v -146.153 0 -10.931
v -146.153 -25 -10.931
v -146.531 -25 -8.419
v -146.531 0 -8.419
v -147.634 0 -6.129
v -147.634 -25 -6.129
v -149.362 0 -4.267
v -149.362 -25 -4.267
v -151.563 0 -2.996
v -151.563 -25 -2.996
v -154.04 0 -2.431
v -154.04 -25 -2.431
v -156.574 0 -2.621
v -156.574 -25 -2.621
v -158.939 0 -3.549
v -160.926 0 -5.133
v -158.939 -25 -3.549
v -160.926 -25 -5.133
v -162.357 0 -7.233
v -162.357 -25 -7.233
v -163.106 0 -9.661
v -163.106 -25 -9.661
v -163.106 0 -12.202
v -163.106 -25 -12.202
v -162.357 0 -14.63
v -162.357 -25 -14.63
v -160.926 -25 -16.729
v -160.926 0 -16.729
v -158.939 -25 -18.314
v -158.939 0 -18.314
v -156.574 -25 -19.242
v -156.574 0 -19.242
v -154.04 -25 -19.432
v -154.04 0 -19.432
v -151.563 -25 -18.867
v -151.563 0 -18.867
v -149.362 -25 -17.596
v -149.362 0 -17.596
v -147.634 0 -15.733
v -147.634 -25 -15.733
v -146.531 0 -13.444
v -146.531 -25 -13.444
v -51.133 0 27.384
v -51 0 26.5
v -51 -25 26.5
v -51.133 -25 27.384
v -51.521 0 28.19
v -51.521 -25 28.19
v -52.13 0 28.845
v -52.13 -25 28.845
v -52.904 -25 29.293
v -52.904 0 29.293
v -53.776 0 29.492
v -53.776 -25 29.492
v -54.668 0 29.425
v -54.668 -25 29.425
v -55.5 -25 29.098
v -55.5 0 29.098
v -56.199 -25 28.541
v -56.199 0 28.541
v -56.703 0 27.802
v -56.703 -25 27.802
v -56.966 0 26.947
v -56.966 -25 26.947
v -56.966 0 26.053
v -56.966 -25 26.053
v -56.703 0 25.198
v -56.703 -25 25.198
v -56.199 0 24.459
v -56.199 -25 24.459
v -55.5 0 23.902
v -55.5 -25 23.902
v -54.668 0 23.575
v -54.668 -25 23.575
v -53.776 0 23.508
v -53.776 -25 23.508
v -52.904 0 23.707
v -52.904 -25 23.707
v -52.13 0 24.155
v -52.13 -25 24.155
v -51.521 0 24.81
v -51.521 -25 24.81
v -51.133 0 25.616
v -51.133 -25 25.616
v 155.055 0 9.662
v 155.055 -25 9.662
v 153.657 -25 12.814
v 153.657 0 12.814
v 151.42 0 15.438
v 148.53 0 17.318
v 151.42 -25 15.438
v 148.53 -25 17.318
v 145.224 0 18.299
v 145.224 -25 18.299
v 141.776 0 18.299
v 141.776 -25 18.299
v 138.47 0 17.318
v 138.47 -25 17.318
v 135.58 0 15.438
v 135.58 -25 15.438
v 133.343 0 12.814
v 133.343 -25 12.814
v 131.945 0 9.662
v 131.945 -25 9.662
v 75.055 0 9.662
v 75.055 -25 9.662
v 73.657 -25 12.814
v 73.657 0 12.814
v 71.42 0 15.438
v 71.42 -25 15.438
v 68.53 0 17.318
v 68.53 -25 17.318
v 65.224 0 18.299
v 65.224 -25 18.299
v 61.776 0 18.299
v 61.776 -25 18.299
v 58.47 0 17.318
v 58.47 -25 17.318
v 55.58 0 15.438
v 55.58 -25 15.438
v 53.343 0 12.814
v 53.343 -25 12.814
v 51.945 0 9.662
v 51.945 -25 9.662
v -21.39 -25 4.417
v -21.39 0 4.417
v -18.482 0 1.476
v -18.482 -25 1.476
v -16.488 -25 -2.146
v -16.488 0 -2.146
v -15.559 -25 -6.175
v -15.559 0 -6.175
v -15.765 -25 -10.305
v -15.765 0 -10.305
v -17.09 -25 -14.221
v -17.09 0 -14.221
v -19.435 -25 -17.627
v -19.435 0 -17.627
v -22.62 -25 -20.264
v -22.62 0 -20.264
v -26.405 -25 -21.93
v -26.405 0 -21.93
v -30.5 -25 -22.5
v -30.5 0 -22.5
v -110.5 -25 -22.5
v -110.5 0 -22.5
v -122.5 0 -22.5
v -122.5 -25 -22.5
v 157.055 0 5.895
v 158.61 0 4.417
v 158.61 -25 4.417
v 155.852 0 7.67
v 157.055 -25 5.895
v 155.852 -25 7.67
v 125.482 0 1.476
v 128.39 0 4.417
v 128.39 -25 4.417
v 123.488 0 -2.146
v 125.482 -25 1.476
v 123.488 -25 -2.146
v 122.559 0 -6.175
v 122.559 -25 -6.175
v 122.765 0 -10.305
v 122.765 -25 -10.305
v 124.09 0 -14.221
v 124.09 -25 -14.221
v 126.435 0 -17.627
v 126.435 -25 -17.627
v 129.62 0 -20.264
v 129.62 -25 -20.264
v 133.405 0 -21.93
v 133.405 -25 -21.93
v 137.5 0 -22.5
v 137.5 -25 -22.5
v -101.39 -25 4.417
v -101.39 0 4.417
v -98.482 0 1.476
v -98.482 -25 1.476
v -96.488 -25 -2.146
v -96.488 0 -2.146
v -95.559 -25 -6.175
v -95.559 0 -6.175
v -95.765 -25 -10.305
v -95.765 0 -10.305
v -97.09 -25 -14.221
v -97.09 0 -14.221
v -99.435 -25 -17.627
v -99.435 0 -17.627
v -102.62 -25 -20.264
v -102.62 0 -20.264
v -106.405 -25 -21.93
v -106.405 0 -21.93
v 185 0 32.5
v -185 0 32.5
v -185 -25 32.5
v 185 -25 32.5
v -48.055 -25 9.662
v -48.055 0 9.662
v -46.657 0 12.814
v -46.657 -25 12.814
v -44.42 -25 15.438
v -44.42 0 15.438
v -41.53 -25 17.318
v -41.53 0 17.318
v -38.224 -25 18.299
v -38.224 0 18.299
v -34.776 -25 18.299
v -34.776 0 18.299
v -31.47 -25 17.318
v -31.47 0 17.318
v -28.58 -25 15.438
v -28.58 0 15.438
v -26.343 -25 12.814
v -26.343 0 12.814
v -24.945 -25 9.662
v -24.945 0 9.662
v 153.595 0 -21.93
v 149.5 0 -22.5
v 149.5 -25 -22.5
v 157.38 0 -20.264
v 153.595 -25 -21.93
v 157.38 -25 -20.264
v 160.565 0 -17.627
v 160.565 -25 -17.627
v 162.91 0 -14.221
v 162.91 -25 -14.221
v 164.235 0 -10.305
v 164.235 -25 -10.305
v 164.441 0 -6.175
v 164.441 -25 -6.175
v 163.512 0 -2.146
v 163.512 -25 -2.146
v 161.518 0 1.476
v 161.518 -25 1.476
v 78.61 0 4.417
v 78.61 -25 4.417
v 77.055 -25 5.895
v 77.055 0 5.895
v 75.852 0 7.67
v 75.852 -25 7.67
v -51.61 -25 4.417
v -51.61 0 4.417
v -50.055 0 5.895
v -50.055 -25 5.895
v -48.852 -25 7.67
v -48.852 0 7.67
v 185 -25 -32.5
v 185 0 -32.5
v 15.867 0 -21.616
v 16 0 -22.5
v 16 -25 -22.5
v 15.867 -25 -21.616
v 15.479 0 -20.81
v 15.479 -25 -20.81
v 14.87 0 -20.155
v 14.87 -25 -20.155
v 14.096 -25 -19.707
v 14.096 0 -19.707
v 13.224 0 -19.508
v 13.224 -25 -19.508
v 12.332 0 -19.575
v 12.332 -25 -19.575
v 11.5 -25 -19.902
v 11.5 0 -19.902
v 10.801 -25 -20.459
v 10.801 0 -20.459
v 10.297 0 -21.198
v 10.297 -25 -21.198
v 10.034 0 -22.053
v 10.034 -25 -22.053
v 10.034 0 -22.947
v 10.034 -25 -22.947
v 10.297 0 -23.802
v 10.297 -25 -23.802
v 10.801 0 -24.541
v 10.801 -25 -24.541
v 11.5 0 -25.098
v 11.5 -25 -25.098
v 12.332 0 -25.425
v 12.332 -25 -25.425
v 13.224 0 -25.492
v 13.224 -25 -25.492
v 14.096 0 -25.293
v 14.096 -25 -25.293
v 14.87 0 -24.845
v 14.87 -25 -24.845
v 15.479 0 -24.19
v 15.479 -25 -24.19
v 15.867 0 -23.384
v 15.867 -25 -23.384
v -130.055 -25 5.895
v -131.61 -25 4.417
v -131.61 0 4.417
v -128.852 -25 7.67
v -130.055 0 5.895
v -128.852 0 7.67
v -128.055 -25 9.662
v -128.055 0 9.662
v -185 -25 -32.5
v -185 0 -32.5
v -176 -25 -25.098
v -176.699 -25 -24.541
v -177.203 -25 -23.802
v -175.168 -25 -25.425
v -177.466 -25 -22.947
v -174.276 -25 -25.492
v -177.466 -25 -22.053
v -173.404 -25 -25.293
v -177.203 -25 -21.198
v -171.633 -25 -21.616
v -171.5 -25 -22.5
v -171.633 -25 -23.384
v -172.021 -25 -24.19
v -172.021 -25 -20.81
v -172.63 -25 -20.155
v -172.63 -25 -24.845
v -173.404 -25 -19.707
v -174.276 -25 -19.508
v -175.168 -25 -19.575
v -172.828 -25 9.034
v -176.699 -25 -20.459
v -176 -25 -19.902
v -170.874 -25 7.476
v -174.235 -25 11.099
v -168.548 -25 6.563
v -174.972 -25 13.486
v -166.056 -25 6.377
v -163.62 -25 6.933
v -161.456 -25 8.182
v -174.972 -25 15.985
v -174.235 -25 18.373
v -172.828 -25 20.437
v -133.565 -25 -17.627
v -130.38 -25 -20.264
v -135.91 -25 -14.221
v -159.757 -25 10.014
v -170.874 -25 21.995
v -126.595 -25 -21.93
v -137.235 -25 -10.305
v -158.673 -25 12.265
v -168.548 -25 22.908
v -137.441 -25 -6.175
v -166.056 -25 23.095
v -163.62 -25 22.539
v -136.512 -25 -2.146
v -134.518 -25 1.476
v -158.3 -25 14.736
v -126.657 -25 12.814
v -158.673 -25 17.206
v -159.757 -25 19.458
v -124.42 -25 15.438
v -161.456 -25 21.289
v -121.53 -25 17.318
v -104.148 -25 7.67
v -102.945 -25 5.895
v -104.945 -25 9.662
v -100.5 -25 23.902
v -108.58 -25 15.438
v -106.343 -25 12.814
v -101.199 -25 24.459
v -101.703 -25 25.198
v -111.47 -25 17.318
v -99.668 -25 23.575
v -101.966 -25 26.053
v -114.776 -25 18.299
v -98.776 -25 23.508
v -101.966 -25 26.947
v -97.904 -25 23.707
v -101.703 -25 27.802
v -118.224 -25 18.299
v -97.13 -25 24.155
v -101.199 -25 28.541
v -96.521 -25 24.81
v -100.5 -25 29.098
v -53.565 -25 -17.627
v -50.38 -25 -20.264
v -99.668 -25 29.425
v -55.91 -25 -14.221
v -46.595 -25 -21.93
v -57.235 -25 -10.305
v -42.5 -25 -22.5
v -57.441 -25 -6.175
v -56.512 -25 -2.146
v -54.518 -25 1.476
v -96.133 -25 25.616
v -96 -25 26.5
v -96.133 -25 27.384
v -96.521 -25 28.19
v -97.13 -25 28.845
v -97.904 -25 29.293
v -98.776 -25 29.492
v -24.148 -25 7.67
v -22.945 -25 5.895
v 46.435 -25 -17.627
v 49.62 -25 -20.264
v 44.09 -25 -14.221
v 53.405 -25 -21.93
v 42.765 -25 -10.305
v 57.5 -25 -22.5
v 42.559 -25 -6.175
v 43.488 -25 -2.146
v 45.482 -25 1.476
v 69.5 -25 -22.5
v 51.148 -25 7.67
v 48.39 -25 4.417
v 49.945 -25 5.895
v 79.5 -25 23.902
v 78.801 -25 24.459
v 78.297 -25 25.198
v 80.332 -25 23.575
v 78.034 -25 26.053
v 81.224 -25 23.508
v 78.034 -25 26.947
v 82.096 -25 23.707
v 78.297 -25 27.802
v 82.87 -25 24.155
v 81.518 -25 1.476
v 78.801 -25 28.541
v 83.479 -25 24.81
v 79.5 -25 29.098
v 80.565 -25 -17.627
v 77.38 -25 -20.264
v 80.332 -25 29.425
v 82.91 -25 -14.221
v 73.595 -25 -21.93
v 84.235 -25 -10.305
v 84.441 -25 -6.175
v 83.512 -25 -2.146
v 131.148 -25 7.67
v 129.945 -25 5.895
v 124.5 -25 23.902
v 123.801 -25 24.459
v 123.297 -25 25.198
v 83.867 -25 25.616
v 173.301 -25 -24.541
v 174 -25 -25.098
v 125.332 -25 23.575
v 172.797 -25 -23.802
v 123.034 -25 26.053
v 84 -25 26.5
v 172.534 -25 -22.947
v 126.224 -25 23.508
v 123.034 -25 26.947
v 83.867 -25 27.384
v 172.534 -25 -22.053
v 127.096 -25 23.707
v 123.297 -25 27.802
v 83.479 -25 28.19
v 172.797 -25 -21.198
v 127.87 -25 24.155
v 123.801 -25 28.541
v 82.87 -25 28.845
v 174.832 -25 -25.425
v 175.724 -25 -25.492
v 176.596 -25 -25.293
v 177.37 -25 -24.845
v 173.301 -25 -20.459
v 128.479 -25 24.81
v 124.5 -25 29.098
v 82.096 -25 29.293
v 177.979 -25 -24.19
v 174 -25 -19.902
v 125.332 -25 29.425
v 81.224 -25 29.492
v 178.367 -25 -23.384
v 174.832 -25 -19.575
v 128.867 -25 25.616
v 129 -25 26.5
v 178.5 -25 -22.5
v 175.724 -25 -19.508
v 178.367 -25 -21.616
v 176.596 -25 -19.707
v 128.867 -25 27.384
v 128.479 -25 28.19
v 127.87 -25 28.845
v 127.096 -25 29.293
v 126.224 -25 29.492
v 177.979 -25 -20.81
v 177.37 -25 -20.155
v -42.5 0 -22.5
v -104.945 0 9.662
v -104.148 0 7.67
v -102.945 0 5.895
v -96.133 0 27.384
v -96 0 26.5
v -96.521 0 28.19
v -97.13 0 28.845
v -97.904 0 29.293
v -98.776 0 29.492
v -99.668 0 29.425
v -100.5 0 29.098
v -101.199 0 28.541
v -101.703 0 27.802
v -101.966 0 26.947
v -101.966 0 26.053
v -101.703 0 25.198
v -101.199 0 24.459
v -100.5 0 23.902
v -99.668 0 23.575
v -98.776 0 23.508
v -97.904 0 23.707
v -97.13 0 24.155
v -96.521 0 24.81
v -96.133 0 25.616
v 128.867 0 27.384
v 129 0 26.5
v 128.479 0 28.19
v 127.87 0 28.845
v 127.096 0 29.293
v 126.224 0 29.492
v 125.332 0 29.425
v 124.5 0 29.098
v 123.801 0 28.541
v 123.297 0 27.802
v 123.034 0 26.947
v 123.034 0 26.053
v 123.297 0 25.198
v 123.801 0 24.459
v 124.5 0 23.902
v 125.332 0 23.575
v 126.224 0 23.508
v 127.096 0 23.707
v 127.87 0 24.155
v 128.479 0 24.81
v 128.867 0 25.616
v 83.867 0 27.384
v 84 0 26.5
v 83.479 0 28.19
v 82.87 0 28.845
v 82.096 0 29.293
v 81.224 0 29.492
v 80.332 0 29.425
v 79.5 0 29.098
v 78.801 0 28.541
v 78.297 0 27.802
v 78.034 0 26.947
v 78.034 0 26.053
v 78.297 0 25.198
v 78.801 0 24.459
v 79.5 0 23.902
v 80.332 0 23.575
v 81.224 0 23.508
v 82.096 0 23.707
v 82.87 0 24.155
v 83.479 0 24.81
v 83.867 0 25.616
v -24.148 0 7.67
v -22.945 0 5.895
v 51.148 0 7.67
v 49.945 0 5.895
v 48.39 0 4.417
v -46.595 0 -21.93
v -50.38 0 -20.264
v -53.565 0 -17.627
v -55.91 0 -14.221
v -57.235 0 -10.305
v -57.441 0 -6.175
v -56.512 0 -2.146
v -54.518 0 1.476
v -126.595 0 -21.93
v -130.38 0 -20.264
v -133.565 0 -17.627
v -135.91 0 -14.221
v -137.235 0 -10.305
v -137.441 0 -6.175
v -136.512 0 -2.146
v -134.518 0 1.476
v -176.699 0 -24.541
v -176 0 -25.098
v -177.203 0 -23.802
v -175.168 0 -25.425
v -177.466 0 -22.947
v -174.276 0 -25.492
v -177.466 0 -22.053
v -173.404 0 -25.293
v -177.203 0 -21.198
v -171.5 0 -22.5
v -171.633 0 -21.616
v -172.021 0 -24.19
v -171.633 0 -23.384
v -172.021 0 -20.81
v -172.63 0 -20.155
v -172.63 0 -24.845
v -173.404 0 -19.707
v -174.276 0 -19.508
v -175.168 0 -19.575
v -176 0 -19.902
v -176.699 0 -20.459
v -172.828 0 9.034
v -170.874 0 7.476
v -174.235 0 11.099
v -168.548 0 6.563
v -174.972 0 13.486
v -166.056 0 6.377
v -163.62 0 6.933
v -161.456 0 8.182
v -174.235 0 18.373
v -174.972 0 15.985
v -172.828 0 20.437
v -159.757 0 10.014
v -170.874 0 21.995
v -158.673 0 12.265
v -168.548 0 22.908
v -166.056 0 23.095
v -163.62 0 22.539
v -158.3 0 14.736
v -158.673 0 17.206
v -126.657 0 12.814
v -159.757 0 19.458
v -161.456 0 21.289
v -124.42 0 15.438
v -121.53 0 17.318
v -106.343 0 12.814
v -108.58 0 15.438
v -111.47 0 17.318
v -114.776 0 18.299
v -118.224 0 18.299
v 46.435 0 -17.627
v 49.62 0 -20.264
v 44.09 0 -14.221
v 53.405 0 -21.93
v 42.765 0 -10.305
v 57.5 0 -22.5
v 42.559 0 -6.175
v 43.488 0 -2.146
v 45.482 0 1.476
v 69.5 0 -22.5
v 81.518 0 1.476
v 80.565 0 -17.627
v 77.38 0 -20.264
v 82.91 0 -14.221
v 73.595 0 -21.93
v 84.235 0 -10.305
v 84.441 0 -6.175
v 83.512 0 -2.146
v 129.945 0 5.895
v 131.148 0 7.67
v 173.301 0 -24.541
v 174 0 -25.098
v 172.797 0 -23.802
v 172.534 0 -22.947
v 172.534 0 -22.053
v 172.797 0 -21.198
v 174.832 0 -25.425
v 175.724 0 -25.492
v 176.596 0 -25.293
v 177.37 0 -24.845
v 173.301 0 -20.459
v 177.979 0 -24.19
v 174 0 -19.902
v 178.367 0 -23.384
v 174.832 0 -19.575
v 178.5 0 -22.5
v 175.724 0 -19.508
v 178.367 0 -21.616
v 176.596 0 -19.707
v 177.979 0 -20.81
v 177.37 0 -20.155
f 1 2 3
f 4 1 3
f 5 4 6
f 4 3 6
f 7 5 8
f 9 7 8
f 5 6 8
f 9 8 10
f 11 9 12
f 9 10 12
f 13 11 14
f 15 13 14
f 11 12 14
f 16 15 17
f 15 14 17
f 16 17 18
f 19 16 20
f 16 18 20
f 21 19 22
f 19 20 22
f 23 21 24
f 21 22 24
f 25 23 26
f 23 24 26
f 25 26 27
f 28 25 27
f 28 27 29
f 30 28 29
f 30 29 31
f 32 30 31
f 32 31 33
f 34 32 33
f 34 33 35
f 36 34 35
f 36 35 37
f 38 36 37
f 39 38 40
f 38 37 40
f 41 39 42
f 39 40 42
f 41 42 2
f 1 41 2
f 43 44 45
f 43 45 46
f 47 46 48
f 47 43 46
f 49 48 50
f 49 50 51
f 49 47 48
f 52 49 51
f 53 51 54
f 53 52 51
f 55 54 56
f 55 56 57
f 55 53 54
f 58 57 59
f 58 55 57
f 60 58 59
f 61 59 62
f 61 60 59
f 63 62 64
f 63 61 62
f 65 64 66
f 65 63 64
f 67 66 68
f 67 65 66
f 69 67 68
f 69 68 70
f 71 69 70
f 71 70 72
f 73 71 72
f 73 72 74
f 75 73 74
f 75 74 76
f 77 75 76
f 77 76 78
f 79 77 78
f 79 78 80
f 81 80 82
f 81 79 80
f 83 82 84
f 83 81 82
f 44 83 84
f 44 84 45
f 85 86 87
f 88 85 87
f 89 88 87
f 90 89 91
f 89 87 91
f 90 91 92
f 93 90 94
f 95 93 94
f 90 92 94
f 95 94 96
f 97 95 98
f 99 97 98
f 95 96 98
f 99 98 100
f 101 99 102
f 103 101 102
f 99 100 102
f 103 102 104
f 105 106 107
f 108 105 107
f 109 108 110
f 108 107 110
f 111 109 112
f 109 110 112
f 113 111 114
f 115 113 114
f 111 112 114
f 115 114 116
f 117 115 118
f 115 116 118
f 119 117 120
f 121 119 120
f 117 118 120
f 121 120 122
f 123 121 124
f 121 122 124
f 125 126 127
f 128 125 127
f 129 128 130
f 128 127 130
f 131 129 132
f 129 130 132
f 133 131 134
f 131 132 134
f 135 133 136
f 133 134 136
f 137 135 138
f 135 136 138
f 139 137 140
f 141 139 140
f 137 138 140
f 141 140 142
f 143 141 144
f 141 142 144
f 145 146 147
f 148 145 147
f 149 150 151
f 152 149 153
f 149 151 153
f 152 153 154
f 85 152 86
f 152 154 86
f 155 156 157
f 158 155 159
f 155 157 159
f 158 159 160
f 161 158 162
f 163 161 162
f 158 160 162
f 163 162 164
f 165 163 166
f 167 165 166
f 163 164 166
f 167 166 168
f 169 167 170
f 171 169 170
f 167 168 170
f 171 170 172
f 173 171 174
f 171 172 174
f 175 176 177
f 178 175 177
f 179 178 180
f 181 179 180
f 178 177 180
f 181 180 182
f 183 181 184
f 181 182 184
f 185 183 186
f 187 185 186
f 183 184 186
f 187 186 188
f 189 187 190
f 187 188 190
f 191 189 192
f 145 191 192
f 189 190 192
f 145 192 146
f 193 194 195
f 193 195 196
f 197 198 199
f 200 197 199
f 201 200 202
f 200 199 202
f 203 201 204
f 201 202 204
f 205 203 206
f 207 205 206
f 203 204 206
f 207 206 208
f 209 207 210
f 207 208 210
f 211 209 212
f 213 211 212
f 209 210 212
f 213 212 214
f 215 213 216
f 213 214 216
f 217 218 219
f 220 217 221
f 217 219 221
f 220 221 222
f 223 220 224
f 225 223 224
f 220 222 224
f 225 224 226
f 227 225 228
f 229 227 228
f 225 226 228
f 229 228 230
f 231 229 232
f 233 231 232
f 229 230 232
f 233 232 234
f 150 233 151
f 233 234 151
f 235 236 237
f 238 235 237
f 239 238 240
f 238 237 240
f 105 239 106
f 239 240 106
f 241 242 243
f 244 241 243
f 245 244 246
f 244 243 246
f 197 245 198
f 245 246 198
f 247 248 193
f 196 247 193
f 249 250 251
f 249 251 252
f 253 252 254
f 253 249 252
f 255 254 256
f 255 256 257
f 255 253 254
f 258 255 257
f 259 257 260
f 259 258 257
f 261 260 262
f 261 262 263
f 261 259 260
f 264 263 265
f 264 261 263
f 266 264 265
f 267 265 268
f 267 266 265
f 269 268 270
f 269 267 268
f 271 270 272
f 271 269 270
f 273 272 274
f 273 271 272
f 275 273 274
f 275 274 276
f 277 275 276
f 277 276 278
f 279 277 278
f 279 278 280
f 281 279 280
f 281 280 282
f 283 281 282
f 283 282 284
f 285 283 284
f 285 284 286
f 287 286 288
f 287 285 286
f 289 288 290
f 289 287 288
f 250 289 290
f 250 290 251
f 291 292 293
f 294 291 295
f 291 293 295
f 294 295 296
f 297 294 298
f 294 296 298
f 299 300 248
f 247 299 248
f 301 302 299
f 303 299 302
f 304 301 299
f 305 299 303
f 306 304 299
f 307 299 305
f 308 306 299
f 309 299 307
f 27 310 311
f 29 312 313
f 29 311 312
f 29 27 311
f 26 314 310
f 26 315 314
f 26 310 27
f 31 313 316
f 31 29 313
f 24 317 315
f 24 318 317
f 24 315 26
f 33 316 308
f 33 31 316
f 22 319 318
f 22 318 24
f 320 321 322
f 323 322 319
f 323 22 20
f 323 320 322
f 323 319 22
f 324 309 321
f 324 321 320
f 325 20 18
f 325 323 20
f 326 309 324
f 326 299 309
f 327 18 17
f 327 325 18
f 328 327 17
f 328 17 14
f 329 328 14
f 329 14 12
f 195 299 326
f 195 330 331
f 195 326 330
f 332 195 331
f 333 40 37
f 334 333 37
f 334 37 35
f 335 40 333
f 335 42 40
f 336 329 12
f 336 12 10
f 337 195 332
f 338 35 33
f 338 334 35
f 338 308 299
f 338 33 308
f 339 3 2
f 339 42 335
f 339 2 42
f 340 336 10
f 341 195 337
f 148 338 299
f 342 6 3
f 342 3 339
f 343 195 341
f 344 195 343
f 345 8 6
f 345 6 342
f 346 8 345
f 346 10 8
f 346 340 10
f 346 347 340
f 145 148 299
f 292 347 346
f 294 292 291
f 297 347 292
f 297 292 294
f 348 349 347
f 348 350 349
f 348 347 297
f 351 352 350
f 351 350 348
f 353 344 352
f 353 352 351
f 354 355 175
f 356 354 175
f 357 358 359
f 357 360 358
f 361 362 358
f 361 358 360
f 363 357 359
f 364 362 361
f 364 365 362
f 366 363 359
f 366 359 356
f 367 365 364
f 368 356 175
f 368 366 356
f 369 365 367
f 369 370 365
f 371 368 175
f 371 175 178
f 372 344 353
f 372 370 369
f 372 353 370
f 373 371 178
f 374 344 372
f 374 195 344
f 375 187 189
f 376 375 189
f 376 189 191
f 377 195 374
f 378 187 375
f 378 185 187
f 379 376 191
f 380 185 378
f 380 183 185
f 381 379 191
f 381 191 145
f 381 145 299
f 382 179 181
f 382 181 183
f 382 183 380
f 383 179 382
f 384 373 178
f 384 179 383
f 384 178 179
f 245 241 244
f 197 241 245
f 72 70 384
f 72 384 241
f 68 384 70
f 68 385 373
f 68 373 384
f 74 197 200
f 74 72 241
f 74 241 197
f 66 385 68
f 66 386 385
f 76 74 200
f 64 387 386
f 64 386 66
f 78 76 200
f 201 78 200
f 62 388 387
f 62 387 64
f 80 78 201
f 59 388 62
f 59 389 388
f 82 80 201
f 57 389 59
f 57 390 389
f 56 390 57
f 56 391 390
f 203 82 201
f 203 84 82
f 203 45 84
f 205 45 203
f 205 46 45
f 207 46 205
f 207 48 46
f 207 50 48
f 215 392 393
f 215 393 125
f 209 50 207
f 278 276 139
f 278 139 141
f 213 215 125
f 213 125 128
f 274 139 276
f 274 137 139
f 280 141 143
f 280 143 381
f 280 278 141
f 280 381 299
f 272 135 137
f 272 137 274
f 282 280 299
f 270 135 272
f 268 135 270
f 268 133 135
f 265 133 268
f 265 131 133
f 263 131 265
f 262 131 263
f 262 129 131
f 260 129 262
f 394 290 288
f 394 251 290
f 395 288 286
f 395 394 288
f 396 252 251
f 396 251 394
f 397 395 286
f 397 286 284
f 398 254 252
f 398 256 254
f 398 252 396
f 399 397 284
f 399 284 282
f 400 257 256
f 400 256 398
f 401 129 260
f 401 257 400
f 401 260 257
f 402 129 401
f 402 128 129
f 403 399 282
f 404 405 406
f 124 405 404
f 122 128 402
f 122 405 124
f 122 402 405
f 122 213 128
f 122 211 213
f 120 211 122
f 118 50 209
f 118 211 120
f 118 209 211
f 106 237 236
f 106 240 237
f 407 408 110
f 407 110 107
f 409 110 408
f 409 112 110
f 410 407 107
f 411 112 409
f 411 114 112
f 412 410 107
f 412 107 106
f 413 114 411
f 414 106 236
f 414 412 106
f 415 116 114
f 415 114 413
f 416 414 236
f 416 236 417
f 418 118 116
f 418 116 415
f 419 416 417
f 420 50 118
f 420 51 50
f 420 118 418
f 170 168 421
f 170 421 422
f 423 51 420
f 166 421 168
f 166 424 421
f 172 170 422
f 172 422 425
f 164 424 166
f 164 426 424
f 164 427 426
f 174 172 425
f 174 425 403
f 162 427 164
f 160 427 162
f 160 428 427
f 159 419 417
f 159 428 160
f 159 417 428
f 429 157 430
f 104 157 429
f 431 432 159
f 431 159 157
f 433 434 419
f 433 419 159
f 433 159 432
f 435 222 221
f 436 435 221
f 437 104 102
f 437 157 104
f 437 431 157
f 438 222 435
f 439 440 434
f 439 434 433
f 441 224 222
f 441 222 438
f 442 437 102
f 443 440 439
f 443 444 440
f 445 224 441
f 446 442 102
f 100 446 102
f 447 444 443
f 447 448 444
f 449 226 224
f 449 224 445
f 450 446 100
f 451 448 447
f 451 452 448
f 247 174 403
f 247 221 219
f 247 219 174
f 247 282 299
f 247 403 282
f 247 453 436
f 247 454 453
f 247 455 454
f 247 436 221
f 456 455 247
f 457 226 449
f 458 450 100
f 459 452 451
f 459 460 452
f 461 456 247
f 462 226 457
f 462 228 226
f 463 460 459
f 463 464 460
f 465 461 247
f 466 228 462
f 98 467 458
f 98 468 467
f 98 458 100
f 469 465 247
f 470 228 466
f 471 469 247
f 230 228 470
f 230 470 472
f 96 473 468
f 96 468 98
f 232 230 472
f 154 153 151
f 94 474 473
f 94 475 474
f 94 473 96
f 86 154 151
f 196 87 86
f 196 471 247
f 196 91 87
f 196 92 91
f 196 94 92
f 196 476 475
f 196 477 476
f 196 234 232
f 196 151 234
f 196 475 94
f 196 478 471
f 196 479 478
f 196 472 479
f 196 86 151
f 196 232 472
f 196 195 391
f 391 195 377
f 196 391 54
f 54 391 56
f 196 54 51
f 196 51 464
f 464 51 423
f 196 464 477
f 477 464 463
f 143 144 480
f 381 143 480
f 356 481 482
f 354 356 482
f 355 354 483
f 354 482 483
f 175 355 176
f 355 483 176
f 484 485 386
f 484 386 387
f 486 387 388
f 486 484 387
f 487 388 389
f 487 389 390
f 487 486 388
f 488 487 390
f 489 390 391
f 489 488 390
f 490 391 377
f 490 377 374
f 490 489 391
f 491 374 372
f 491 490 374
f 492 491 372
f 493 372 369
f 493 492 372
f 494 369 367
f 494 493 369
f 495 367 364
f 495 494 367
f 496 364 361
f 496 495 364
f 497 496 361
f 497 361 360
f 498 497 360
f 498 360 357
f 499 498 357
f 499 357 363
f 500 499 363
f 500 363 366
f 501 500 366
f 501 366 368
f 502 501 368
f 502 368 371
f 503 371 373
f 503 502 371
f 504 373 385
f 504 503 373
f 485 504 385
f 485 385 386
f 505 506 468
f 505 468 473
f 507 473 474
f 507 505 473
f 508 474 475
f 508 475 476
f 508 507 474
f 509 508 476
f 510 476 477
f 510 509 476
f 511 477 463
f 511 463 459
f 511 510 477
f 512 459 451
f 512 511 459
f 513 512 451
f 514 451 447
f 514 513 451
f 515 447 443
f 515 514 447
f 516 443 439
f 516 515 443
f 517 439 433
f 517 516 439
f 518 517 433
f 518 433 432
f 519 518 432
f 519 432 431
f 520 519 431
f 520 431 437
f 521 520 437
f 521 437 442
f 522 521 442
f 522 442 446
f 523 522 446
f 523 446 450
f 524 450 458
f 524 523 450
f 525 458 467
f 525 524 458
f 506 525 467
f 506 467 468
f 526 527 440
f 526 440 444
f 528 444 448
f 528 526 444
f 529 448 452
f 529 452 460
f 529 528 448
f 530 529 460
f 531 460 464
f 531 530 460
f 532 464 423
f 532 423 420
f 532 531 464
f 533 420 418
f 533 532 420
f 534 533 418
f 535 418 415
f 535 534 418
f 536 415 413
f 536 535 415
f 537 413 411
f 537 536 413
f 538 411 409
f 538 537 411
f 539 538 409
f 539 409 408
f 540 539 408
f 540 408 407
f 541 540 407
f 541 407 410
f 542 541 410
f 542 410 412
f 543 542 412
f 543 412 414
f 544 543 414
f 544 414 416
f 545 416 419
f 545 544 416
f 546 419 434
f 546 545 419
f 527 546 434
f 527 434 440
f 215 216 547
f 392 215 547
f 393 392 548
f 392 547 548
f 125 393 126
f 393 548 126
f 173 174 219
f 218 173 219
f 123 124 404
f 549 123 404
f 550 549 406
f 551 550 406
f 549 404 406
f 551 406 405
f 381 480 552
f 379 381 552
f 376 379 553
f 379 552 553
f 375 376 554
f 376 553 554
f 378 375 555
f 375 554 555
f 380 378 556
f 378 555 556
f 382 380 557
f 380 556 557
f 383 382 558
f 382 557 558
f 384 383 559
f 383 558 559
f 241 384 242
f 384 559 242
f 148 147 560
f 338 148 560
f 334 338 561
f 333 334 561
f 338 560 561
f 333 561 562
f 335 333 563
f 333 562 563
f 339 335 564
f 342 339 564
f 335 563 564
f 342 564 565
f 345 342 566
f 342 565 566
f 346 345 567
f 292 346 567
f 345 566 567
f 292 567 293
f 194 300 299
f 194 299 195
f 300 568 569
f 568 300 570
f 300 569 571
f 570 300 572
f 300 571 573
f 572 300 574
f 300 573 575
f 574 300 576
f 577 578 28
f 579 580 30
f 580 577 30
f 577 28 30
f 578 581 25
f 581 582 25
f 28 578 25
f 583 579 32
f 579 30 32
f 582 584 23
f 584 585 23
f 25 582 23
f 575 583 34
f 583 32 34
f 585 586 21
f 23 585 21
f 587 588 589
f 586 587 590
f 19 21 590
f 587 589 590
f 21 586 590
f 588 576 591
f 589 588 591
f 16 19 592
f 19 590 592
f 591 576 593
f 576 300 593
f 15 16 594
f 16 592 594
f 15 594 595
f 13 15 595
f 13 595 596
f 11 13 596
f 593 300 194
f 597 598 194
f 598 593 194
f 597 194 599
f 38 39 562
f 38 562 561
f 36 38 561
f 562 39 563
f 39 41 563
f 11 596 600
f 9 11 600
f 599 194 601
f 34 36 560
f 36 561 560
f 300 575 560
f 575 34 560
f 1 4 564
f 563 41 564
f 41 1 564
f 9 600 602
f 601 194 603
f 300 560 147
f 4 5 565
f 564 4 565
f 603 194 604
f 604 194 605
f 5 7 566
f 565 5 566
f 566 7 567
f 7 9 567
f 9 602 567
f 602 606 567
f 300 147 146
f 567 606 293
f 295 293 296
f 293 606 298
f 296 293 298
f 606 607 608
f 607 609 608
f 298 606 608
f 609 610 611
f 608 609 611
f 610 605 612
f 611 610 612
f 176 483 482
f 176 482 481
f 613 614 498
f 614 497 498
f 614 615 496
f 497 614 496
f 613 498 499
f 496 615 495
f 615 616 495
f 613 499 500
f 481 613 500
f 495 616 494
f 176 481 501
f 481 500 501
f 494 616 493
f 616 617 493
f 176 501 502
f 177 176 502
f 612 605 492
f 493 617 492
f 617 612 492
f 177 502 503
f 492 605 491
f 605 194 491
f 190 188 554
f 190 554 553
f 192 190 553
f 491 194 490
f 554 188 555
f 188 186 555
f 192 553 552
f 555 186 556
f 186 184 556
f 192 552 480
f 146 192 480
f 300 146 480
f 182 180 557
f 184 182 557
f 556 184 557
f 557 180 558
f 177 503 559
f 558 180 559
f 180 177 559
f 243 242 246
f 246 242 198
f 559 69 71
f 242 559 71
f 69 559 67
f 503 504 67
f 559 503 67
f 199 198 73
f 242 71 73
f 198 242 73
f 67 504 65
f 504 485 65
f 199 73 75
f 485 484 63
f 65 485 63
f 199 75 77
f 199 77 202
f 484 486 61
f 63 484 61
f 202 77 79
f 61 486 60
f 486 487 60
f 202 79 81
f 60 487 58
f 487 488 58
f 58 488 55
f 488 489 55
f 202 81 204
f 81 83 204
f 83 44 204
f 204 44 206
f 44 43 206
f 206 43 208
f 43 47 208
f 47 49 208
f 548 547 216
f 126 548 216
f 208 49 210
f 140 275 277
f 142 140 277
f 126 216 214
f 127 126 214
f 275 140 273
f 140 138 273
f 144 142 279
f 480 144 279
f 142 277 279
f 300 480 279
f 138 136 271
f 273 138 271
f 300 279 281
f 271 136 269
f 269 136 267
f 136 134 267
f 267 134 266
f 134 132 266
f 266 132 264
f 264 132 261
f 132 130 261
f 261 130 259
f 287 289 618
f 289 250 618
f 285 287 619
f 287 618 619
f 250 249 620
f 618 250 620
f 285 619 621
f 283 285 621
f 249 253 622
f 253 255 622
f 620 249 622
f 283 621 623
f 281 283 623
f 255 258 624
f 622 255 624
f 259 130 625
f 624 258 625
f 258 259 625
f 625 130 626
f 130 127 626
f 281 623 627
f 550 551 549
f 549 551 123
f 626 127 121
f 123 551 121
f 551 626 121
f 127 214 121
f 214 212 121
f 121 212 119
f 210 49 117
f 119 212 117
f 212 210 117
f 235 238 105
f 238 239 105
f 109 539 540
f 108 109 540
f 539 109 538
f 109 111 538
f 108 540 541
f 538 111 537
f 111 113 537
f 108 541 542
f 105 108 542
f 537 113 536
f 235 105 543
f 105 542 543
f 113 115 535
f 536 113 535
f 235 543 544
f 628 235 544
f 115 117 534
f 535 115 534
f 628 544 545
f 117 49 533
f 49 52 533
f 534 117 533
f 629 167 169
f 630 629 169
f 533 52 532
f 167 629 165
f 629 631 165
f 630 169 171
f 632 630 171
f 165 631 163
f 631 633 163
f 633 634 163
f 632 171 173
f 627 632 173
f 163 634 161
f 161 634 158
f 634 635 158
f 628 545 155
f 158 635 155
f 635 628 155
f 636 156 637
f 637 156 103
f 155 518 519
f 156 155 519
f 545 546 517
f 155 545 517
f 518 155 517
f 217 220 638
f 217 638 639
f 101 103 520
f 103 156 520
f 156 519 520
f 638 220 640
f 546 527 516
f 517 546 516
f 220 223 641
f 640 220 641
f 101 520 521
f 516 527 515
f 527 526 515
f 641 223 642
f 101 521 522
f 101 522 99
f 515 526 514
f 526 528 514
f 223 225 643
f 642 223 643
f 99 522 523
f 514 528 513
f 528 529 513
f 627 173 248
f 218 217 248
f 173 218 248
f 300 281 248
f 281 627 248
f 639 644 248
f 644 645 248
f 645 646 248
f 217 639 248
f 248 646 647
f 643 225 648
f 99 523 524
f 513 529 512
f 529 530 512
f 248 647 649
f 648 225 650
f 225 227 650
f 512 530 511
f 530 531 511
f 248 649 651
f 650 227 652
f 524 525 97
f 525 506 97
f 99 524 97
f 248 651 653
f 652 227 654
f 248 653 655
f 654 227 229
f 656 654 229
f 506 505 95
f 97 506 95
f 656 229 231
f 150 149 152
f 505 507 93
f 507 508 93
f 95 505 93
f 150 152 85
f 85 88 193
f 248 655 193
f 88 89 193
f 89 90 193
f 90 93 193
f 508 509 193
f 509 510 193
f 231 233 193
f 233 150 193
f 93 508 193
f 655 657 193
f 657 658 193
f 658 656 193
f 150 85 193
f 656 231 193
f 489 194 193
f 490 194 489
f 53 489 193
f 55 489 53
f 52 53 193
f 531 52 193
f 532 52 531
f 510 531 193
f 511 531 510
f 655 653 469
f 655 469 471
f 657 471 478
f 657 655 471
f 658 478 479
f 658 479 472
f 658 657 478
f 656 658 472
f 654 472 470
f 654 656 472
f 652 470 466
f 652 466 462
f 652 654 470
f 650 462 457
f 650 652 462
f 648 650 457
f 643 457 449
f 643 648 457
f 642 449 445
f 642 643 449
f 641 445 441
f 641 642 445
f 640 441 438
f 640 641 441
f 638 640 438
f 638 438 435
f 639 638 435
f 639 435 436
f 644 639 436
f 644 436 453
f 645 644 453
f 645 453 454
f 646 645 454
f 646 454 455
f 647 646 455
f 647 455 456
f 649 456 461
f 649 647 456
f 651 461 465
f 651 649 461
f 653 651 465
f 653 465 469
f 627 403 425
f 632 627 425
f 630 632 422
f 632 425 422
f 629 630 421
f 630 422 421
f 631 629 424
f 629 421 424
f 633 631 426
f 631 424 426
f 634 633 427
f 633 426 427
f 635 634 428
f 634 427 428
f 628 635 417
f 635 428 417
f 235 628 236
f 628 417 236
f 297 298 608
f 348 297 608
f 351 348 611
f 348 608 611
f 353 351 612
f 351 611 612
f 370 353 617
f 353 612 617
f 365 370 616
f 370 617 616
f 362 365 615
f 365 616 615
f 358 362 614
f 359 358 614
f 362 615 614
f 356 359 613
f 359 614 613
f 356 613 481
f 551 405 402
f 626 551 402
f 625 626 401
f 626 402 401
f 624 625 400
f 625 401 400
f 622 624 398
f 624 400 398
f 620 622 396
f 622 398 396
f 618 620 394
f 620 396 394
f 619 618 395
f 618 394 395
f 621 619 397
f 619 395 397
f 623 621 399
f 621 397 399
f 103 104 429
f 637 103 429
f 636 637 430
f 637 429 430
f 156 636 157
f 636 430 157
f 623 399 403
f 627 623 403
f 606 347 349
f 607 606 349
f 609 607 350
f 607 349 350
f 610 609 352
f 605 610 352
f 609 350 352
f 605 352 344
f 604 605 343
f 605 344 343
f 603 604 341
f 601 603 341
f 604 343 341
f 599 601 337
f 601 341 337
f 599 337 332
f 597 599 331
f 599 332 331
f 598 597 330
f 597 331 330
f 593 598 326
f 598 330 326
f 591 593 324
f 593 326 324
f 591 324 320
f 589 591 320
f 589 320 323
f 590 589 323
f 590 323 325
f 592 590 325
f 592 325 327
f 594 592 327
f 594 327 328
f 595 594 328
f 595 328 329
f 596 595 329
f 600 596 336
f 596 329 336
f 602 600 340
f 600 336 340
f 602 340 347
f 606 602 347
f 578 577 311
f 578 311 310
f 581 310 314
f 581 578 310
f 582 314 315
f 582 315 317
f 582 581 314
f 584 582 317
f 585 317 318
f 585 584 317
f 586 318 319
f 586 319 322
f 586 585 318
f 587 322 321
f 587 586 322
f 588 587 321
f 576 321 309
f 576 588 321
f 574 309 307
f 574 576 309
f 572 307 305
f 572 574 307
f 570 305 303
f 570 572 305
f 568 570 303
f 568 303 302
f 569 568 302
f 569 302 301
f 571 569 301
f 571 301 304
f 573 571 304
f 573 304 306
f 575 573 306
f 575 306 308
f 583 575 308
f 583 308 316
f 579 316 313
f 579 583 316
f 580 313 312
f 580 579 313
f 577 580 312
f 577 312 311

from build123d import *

# Parameters (mm, degrees)
F0_W     = 370
F0_H     = 65
F0_R     = 3
F1_DEPTH = 25
F3_DEPTH = 25
F4_R     = 8.382557
F4_R_2   = 8.524465
F5_DEPTH = 25


with BuildPart() as f1:
    # F0 (on Front) → F1 (new body)
    with BuildSketch(Plane.XZ):
        Rectangle(F0_W, F0_H)
        with Locations((-174.5, -22.5)):
            Circle(F0_R, mode=Mode.SUBTRACT)
        with BuildLine():
            ThreePointArc((-128.054669, 9.662031), (-116.5, 18.423264), (-104.945331, 9.662031))
            ThreePointArc((-104.945331, 9.662031), (-103.594078, 6.750238), (-101.389864, 4.416603))
            ThreePointArc((-101.389864, 4.416603), (-96.291745, -12.308896), (-110.5, -22.5))
            Line((-110.5, -22.5), (-122.5, -22.5))
            ThreePointArc((-122.5, -22.5), (-136.708255, -12.308896), (-131.610136, 4.416603))
            ThreePointArc((-131.610136, 4.416603), (-129.405922, 6.750238), (-128.054669, 9.662031))
        make_face(mode=Mode.SUBTRACT)
        with BuildLine():
            ThreePointArc((-48.054669, 9.662031), (-36.5, 18.423264), (-24.945331, 9.662031))
            ThreePointArc((-24.945331, 9.662031), (-23.594078, 6.750238), (-21.389864, 4.416603))
            ThreePointArc((-21.389864, 4.416603), (-16.291745, -12.308896), (-30.5, -22.5))
            Line((-30.5, -22.5), (-42.5, -22.5))
            ThreePointArc((-42.5, -22.5), (-56.708255, -12.308896), (-51.610136, 4.416603))
            ThreePointArc((-51.610136, 4.416603), (-49.405922, 6.750238), (-48.054669, 9.662031))
        make_face(mode=Mode.SUBTRACT)
        with Locations((13, -22.5)):
            Circle(F0_R, mode=Mode.SUBTRACT)
        with Locations((175.5, -22.5)):
            Circle(F0_R, mode=Mode.SUBTRACT)
        with Locations((-99, 26.5)):
            Circle(F0_R, mode=Mode.SUBTRACT)
        with Locations((-54, 26.5)):
            Circle(F0_R, mode=Mode.SUBTRACT)
        with Locations((81, 26.5)):
            Circle(F0_R, mode=Mode.SUBTRACT)
        with Locations((126, 26.5)):
            Circle(F0_R, mode=Mode.SUBTRACT)
    extrude(amount=F1_DEPTH)

    # F2 (on face) → F3 (cut)
    with BuildSketch(Plane.XZ.offset(25)):
        with BuildLine():
            ThreePointArc((128.389864, 4.416603), (123.291745, -12.308896), (137.5, -22.5))
            Line((137.5, -22.5), (149.5, -22.5))
            ThreePointArc((149.5, -22.5), (163.708255, -12.308896), (158.610136, 4.416603))
            ThreePointArc((158.610136, 4.416603), (156.405922, 6.750238), (155.054669, 9.662031))
            ThreePointArc((155.054669, 9.662031), (143.5, 18.423264), (131.945331, 9.662031))
            ThreePointArc((131.945331, 9.662031), (130.594078, 6.750238), (128.389864, 4.416603))
        make_face()
        with BuildLine():
            Line((57.5, -22.5), (69.5, -22.5))
            ThreePointArc((69.5, -22.5), (83.708255, -12.308896), (78.610136, 4.416603))
            ThreePointArc((78.610136, 4.416603), (76.405922, 6.750238), (75.054669, 9.662031))
            ThreePointArc((75.054669, 9.662031), (63.5, 18.423264), (51.945331, 9.662031))
            ThreePointArc((51.945331, 9.662031), (50.594078, 6.750238), (48.389864, 4.416603))
            ThreePointArc((48.389864, 4.416603), (43.291745, -12.308896), (57.5, -22.5))
        make_face()
    extrude(amount=-F3_DEPTH, mode=Mode.SUBTRACT)

    # F4 (on face) → F5 (cut)
    with BuildSketch(Plane.XZ.offset(25)):
        with Locations((-166.68272, 14.735676)):
            Circle(F4_R)
        with Locations((-154.677153, -10.931376)):
            Circle(F4_R_2)
    extrude(amount=-F5_DEPTH, mode=Mode.SUBTRACT)


solid = f1.part
